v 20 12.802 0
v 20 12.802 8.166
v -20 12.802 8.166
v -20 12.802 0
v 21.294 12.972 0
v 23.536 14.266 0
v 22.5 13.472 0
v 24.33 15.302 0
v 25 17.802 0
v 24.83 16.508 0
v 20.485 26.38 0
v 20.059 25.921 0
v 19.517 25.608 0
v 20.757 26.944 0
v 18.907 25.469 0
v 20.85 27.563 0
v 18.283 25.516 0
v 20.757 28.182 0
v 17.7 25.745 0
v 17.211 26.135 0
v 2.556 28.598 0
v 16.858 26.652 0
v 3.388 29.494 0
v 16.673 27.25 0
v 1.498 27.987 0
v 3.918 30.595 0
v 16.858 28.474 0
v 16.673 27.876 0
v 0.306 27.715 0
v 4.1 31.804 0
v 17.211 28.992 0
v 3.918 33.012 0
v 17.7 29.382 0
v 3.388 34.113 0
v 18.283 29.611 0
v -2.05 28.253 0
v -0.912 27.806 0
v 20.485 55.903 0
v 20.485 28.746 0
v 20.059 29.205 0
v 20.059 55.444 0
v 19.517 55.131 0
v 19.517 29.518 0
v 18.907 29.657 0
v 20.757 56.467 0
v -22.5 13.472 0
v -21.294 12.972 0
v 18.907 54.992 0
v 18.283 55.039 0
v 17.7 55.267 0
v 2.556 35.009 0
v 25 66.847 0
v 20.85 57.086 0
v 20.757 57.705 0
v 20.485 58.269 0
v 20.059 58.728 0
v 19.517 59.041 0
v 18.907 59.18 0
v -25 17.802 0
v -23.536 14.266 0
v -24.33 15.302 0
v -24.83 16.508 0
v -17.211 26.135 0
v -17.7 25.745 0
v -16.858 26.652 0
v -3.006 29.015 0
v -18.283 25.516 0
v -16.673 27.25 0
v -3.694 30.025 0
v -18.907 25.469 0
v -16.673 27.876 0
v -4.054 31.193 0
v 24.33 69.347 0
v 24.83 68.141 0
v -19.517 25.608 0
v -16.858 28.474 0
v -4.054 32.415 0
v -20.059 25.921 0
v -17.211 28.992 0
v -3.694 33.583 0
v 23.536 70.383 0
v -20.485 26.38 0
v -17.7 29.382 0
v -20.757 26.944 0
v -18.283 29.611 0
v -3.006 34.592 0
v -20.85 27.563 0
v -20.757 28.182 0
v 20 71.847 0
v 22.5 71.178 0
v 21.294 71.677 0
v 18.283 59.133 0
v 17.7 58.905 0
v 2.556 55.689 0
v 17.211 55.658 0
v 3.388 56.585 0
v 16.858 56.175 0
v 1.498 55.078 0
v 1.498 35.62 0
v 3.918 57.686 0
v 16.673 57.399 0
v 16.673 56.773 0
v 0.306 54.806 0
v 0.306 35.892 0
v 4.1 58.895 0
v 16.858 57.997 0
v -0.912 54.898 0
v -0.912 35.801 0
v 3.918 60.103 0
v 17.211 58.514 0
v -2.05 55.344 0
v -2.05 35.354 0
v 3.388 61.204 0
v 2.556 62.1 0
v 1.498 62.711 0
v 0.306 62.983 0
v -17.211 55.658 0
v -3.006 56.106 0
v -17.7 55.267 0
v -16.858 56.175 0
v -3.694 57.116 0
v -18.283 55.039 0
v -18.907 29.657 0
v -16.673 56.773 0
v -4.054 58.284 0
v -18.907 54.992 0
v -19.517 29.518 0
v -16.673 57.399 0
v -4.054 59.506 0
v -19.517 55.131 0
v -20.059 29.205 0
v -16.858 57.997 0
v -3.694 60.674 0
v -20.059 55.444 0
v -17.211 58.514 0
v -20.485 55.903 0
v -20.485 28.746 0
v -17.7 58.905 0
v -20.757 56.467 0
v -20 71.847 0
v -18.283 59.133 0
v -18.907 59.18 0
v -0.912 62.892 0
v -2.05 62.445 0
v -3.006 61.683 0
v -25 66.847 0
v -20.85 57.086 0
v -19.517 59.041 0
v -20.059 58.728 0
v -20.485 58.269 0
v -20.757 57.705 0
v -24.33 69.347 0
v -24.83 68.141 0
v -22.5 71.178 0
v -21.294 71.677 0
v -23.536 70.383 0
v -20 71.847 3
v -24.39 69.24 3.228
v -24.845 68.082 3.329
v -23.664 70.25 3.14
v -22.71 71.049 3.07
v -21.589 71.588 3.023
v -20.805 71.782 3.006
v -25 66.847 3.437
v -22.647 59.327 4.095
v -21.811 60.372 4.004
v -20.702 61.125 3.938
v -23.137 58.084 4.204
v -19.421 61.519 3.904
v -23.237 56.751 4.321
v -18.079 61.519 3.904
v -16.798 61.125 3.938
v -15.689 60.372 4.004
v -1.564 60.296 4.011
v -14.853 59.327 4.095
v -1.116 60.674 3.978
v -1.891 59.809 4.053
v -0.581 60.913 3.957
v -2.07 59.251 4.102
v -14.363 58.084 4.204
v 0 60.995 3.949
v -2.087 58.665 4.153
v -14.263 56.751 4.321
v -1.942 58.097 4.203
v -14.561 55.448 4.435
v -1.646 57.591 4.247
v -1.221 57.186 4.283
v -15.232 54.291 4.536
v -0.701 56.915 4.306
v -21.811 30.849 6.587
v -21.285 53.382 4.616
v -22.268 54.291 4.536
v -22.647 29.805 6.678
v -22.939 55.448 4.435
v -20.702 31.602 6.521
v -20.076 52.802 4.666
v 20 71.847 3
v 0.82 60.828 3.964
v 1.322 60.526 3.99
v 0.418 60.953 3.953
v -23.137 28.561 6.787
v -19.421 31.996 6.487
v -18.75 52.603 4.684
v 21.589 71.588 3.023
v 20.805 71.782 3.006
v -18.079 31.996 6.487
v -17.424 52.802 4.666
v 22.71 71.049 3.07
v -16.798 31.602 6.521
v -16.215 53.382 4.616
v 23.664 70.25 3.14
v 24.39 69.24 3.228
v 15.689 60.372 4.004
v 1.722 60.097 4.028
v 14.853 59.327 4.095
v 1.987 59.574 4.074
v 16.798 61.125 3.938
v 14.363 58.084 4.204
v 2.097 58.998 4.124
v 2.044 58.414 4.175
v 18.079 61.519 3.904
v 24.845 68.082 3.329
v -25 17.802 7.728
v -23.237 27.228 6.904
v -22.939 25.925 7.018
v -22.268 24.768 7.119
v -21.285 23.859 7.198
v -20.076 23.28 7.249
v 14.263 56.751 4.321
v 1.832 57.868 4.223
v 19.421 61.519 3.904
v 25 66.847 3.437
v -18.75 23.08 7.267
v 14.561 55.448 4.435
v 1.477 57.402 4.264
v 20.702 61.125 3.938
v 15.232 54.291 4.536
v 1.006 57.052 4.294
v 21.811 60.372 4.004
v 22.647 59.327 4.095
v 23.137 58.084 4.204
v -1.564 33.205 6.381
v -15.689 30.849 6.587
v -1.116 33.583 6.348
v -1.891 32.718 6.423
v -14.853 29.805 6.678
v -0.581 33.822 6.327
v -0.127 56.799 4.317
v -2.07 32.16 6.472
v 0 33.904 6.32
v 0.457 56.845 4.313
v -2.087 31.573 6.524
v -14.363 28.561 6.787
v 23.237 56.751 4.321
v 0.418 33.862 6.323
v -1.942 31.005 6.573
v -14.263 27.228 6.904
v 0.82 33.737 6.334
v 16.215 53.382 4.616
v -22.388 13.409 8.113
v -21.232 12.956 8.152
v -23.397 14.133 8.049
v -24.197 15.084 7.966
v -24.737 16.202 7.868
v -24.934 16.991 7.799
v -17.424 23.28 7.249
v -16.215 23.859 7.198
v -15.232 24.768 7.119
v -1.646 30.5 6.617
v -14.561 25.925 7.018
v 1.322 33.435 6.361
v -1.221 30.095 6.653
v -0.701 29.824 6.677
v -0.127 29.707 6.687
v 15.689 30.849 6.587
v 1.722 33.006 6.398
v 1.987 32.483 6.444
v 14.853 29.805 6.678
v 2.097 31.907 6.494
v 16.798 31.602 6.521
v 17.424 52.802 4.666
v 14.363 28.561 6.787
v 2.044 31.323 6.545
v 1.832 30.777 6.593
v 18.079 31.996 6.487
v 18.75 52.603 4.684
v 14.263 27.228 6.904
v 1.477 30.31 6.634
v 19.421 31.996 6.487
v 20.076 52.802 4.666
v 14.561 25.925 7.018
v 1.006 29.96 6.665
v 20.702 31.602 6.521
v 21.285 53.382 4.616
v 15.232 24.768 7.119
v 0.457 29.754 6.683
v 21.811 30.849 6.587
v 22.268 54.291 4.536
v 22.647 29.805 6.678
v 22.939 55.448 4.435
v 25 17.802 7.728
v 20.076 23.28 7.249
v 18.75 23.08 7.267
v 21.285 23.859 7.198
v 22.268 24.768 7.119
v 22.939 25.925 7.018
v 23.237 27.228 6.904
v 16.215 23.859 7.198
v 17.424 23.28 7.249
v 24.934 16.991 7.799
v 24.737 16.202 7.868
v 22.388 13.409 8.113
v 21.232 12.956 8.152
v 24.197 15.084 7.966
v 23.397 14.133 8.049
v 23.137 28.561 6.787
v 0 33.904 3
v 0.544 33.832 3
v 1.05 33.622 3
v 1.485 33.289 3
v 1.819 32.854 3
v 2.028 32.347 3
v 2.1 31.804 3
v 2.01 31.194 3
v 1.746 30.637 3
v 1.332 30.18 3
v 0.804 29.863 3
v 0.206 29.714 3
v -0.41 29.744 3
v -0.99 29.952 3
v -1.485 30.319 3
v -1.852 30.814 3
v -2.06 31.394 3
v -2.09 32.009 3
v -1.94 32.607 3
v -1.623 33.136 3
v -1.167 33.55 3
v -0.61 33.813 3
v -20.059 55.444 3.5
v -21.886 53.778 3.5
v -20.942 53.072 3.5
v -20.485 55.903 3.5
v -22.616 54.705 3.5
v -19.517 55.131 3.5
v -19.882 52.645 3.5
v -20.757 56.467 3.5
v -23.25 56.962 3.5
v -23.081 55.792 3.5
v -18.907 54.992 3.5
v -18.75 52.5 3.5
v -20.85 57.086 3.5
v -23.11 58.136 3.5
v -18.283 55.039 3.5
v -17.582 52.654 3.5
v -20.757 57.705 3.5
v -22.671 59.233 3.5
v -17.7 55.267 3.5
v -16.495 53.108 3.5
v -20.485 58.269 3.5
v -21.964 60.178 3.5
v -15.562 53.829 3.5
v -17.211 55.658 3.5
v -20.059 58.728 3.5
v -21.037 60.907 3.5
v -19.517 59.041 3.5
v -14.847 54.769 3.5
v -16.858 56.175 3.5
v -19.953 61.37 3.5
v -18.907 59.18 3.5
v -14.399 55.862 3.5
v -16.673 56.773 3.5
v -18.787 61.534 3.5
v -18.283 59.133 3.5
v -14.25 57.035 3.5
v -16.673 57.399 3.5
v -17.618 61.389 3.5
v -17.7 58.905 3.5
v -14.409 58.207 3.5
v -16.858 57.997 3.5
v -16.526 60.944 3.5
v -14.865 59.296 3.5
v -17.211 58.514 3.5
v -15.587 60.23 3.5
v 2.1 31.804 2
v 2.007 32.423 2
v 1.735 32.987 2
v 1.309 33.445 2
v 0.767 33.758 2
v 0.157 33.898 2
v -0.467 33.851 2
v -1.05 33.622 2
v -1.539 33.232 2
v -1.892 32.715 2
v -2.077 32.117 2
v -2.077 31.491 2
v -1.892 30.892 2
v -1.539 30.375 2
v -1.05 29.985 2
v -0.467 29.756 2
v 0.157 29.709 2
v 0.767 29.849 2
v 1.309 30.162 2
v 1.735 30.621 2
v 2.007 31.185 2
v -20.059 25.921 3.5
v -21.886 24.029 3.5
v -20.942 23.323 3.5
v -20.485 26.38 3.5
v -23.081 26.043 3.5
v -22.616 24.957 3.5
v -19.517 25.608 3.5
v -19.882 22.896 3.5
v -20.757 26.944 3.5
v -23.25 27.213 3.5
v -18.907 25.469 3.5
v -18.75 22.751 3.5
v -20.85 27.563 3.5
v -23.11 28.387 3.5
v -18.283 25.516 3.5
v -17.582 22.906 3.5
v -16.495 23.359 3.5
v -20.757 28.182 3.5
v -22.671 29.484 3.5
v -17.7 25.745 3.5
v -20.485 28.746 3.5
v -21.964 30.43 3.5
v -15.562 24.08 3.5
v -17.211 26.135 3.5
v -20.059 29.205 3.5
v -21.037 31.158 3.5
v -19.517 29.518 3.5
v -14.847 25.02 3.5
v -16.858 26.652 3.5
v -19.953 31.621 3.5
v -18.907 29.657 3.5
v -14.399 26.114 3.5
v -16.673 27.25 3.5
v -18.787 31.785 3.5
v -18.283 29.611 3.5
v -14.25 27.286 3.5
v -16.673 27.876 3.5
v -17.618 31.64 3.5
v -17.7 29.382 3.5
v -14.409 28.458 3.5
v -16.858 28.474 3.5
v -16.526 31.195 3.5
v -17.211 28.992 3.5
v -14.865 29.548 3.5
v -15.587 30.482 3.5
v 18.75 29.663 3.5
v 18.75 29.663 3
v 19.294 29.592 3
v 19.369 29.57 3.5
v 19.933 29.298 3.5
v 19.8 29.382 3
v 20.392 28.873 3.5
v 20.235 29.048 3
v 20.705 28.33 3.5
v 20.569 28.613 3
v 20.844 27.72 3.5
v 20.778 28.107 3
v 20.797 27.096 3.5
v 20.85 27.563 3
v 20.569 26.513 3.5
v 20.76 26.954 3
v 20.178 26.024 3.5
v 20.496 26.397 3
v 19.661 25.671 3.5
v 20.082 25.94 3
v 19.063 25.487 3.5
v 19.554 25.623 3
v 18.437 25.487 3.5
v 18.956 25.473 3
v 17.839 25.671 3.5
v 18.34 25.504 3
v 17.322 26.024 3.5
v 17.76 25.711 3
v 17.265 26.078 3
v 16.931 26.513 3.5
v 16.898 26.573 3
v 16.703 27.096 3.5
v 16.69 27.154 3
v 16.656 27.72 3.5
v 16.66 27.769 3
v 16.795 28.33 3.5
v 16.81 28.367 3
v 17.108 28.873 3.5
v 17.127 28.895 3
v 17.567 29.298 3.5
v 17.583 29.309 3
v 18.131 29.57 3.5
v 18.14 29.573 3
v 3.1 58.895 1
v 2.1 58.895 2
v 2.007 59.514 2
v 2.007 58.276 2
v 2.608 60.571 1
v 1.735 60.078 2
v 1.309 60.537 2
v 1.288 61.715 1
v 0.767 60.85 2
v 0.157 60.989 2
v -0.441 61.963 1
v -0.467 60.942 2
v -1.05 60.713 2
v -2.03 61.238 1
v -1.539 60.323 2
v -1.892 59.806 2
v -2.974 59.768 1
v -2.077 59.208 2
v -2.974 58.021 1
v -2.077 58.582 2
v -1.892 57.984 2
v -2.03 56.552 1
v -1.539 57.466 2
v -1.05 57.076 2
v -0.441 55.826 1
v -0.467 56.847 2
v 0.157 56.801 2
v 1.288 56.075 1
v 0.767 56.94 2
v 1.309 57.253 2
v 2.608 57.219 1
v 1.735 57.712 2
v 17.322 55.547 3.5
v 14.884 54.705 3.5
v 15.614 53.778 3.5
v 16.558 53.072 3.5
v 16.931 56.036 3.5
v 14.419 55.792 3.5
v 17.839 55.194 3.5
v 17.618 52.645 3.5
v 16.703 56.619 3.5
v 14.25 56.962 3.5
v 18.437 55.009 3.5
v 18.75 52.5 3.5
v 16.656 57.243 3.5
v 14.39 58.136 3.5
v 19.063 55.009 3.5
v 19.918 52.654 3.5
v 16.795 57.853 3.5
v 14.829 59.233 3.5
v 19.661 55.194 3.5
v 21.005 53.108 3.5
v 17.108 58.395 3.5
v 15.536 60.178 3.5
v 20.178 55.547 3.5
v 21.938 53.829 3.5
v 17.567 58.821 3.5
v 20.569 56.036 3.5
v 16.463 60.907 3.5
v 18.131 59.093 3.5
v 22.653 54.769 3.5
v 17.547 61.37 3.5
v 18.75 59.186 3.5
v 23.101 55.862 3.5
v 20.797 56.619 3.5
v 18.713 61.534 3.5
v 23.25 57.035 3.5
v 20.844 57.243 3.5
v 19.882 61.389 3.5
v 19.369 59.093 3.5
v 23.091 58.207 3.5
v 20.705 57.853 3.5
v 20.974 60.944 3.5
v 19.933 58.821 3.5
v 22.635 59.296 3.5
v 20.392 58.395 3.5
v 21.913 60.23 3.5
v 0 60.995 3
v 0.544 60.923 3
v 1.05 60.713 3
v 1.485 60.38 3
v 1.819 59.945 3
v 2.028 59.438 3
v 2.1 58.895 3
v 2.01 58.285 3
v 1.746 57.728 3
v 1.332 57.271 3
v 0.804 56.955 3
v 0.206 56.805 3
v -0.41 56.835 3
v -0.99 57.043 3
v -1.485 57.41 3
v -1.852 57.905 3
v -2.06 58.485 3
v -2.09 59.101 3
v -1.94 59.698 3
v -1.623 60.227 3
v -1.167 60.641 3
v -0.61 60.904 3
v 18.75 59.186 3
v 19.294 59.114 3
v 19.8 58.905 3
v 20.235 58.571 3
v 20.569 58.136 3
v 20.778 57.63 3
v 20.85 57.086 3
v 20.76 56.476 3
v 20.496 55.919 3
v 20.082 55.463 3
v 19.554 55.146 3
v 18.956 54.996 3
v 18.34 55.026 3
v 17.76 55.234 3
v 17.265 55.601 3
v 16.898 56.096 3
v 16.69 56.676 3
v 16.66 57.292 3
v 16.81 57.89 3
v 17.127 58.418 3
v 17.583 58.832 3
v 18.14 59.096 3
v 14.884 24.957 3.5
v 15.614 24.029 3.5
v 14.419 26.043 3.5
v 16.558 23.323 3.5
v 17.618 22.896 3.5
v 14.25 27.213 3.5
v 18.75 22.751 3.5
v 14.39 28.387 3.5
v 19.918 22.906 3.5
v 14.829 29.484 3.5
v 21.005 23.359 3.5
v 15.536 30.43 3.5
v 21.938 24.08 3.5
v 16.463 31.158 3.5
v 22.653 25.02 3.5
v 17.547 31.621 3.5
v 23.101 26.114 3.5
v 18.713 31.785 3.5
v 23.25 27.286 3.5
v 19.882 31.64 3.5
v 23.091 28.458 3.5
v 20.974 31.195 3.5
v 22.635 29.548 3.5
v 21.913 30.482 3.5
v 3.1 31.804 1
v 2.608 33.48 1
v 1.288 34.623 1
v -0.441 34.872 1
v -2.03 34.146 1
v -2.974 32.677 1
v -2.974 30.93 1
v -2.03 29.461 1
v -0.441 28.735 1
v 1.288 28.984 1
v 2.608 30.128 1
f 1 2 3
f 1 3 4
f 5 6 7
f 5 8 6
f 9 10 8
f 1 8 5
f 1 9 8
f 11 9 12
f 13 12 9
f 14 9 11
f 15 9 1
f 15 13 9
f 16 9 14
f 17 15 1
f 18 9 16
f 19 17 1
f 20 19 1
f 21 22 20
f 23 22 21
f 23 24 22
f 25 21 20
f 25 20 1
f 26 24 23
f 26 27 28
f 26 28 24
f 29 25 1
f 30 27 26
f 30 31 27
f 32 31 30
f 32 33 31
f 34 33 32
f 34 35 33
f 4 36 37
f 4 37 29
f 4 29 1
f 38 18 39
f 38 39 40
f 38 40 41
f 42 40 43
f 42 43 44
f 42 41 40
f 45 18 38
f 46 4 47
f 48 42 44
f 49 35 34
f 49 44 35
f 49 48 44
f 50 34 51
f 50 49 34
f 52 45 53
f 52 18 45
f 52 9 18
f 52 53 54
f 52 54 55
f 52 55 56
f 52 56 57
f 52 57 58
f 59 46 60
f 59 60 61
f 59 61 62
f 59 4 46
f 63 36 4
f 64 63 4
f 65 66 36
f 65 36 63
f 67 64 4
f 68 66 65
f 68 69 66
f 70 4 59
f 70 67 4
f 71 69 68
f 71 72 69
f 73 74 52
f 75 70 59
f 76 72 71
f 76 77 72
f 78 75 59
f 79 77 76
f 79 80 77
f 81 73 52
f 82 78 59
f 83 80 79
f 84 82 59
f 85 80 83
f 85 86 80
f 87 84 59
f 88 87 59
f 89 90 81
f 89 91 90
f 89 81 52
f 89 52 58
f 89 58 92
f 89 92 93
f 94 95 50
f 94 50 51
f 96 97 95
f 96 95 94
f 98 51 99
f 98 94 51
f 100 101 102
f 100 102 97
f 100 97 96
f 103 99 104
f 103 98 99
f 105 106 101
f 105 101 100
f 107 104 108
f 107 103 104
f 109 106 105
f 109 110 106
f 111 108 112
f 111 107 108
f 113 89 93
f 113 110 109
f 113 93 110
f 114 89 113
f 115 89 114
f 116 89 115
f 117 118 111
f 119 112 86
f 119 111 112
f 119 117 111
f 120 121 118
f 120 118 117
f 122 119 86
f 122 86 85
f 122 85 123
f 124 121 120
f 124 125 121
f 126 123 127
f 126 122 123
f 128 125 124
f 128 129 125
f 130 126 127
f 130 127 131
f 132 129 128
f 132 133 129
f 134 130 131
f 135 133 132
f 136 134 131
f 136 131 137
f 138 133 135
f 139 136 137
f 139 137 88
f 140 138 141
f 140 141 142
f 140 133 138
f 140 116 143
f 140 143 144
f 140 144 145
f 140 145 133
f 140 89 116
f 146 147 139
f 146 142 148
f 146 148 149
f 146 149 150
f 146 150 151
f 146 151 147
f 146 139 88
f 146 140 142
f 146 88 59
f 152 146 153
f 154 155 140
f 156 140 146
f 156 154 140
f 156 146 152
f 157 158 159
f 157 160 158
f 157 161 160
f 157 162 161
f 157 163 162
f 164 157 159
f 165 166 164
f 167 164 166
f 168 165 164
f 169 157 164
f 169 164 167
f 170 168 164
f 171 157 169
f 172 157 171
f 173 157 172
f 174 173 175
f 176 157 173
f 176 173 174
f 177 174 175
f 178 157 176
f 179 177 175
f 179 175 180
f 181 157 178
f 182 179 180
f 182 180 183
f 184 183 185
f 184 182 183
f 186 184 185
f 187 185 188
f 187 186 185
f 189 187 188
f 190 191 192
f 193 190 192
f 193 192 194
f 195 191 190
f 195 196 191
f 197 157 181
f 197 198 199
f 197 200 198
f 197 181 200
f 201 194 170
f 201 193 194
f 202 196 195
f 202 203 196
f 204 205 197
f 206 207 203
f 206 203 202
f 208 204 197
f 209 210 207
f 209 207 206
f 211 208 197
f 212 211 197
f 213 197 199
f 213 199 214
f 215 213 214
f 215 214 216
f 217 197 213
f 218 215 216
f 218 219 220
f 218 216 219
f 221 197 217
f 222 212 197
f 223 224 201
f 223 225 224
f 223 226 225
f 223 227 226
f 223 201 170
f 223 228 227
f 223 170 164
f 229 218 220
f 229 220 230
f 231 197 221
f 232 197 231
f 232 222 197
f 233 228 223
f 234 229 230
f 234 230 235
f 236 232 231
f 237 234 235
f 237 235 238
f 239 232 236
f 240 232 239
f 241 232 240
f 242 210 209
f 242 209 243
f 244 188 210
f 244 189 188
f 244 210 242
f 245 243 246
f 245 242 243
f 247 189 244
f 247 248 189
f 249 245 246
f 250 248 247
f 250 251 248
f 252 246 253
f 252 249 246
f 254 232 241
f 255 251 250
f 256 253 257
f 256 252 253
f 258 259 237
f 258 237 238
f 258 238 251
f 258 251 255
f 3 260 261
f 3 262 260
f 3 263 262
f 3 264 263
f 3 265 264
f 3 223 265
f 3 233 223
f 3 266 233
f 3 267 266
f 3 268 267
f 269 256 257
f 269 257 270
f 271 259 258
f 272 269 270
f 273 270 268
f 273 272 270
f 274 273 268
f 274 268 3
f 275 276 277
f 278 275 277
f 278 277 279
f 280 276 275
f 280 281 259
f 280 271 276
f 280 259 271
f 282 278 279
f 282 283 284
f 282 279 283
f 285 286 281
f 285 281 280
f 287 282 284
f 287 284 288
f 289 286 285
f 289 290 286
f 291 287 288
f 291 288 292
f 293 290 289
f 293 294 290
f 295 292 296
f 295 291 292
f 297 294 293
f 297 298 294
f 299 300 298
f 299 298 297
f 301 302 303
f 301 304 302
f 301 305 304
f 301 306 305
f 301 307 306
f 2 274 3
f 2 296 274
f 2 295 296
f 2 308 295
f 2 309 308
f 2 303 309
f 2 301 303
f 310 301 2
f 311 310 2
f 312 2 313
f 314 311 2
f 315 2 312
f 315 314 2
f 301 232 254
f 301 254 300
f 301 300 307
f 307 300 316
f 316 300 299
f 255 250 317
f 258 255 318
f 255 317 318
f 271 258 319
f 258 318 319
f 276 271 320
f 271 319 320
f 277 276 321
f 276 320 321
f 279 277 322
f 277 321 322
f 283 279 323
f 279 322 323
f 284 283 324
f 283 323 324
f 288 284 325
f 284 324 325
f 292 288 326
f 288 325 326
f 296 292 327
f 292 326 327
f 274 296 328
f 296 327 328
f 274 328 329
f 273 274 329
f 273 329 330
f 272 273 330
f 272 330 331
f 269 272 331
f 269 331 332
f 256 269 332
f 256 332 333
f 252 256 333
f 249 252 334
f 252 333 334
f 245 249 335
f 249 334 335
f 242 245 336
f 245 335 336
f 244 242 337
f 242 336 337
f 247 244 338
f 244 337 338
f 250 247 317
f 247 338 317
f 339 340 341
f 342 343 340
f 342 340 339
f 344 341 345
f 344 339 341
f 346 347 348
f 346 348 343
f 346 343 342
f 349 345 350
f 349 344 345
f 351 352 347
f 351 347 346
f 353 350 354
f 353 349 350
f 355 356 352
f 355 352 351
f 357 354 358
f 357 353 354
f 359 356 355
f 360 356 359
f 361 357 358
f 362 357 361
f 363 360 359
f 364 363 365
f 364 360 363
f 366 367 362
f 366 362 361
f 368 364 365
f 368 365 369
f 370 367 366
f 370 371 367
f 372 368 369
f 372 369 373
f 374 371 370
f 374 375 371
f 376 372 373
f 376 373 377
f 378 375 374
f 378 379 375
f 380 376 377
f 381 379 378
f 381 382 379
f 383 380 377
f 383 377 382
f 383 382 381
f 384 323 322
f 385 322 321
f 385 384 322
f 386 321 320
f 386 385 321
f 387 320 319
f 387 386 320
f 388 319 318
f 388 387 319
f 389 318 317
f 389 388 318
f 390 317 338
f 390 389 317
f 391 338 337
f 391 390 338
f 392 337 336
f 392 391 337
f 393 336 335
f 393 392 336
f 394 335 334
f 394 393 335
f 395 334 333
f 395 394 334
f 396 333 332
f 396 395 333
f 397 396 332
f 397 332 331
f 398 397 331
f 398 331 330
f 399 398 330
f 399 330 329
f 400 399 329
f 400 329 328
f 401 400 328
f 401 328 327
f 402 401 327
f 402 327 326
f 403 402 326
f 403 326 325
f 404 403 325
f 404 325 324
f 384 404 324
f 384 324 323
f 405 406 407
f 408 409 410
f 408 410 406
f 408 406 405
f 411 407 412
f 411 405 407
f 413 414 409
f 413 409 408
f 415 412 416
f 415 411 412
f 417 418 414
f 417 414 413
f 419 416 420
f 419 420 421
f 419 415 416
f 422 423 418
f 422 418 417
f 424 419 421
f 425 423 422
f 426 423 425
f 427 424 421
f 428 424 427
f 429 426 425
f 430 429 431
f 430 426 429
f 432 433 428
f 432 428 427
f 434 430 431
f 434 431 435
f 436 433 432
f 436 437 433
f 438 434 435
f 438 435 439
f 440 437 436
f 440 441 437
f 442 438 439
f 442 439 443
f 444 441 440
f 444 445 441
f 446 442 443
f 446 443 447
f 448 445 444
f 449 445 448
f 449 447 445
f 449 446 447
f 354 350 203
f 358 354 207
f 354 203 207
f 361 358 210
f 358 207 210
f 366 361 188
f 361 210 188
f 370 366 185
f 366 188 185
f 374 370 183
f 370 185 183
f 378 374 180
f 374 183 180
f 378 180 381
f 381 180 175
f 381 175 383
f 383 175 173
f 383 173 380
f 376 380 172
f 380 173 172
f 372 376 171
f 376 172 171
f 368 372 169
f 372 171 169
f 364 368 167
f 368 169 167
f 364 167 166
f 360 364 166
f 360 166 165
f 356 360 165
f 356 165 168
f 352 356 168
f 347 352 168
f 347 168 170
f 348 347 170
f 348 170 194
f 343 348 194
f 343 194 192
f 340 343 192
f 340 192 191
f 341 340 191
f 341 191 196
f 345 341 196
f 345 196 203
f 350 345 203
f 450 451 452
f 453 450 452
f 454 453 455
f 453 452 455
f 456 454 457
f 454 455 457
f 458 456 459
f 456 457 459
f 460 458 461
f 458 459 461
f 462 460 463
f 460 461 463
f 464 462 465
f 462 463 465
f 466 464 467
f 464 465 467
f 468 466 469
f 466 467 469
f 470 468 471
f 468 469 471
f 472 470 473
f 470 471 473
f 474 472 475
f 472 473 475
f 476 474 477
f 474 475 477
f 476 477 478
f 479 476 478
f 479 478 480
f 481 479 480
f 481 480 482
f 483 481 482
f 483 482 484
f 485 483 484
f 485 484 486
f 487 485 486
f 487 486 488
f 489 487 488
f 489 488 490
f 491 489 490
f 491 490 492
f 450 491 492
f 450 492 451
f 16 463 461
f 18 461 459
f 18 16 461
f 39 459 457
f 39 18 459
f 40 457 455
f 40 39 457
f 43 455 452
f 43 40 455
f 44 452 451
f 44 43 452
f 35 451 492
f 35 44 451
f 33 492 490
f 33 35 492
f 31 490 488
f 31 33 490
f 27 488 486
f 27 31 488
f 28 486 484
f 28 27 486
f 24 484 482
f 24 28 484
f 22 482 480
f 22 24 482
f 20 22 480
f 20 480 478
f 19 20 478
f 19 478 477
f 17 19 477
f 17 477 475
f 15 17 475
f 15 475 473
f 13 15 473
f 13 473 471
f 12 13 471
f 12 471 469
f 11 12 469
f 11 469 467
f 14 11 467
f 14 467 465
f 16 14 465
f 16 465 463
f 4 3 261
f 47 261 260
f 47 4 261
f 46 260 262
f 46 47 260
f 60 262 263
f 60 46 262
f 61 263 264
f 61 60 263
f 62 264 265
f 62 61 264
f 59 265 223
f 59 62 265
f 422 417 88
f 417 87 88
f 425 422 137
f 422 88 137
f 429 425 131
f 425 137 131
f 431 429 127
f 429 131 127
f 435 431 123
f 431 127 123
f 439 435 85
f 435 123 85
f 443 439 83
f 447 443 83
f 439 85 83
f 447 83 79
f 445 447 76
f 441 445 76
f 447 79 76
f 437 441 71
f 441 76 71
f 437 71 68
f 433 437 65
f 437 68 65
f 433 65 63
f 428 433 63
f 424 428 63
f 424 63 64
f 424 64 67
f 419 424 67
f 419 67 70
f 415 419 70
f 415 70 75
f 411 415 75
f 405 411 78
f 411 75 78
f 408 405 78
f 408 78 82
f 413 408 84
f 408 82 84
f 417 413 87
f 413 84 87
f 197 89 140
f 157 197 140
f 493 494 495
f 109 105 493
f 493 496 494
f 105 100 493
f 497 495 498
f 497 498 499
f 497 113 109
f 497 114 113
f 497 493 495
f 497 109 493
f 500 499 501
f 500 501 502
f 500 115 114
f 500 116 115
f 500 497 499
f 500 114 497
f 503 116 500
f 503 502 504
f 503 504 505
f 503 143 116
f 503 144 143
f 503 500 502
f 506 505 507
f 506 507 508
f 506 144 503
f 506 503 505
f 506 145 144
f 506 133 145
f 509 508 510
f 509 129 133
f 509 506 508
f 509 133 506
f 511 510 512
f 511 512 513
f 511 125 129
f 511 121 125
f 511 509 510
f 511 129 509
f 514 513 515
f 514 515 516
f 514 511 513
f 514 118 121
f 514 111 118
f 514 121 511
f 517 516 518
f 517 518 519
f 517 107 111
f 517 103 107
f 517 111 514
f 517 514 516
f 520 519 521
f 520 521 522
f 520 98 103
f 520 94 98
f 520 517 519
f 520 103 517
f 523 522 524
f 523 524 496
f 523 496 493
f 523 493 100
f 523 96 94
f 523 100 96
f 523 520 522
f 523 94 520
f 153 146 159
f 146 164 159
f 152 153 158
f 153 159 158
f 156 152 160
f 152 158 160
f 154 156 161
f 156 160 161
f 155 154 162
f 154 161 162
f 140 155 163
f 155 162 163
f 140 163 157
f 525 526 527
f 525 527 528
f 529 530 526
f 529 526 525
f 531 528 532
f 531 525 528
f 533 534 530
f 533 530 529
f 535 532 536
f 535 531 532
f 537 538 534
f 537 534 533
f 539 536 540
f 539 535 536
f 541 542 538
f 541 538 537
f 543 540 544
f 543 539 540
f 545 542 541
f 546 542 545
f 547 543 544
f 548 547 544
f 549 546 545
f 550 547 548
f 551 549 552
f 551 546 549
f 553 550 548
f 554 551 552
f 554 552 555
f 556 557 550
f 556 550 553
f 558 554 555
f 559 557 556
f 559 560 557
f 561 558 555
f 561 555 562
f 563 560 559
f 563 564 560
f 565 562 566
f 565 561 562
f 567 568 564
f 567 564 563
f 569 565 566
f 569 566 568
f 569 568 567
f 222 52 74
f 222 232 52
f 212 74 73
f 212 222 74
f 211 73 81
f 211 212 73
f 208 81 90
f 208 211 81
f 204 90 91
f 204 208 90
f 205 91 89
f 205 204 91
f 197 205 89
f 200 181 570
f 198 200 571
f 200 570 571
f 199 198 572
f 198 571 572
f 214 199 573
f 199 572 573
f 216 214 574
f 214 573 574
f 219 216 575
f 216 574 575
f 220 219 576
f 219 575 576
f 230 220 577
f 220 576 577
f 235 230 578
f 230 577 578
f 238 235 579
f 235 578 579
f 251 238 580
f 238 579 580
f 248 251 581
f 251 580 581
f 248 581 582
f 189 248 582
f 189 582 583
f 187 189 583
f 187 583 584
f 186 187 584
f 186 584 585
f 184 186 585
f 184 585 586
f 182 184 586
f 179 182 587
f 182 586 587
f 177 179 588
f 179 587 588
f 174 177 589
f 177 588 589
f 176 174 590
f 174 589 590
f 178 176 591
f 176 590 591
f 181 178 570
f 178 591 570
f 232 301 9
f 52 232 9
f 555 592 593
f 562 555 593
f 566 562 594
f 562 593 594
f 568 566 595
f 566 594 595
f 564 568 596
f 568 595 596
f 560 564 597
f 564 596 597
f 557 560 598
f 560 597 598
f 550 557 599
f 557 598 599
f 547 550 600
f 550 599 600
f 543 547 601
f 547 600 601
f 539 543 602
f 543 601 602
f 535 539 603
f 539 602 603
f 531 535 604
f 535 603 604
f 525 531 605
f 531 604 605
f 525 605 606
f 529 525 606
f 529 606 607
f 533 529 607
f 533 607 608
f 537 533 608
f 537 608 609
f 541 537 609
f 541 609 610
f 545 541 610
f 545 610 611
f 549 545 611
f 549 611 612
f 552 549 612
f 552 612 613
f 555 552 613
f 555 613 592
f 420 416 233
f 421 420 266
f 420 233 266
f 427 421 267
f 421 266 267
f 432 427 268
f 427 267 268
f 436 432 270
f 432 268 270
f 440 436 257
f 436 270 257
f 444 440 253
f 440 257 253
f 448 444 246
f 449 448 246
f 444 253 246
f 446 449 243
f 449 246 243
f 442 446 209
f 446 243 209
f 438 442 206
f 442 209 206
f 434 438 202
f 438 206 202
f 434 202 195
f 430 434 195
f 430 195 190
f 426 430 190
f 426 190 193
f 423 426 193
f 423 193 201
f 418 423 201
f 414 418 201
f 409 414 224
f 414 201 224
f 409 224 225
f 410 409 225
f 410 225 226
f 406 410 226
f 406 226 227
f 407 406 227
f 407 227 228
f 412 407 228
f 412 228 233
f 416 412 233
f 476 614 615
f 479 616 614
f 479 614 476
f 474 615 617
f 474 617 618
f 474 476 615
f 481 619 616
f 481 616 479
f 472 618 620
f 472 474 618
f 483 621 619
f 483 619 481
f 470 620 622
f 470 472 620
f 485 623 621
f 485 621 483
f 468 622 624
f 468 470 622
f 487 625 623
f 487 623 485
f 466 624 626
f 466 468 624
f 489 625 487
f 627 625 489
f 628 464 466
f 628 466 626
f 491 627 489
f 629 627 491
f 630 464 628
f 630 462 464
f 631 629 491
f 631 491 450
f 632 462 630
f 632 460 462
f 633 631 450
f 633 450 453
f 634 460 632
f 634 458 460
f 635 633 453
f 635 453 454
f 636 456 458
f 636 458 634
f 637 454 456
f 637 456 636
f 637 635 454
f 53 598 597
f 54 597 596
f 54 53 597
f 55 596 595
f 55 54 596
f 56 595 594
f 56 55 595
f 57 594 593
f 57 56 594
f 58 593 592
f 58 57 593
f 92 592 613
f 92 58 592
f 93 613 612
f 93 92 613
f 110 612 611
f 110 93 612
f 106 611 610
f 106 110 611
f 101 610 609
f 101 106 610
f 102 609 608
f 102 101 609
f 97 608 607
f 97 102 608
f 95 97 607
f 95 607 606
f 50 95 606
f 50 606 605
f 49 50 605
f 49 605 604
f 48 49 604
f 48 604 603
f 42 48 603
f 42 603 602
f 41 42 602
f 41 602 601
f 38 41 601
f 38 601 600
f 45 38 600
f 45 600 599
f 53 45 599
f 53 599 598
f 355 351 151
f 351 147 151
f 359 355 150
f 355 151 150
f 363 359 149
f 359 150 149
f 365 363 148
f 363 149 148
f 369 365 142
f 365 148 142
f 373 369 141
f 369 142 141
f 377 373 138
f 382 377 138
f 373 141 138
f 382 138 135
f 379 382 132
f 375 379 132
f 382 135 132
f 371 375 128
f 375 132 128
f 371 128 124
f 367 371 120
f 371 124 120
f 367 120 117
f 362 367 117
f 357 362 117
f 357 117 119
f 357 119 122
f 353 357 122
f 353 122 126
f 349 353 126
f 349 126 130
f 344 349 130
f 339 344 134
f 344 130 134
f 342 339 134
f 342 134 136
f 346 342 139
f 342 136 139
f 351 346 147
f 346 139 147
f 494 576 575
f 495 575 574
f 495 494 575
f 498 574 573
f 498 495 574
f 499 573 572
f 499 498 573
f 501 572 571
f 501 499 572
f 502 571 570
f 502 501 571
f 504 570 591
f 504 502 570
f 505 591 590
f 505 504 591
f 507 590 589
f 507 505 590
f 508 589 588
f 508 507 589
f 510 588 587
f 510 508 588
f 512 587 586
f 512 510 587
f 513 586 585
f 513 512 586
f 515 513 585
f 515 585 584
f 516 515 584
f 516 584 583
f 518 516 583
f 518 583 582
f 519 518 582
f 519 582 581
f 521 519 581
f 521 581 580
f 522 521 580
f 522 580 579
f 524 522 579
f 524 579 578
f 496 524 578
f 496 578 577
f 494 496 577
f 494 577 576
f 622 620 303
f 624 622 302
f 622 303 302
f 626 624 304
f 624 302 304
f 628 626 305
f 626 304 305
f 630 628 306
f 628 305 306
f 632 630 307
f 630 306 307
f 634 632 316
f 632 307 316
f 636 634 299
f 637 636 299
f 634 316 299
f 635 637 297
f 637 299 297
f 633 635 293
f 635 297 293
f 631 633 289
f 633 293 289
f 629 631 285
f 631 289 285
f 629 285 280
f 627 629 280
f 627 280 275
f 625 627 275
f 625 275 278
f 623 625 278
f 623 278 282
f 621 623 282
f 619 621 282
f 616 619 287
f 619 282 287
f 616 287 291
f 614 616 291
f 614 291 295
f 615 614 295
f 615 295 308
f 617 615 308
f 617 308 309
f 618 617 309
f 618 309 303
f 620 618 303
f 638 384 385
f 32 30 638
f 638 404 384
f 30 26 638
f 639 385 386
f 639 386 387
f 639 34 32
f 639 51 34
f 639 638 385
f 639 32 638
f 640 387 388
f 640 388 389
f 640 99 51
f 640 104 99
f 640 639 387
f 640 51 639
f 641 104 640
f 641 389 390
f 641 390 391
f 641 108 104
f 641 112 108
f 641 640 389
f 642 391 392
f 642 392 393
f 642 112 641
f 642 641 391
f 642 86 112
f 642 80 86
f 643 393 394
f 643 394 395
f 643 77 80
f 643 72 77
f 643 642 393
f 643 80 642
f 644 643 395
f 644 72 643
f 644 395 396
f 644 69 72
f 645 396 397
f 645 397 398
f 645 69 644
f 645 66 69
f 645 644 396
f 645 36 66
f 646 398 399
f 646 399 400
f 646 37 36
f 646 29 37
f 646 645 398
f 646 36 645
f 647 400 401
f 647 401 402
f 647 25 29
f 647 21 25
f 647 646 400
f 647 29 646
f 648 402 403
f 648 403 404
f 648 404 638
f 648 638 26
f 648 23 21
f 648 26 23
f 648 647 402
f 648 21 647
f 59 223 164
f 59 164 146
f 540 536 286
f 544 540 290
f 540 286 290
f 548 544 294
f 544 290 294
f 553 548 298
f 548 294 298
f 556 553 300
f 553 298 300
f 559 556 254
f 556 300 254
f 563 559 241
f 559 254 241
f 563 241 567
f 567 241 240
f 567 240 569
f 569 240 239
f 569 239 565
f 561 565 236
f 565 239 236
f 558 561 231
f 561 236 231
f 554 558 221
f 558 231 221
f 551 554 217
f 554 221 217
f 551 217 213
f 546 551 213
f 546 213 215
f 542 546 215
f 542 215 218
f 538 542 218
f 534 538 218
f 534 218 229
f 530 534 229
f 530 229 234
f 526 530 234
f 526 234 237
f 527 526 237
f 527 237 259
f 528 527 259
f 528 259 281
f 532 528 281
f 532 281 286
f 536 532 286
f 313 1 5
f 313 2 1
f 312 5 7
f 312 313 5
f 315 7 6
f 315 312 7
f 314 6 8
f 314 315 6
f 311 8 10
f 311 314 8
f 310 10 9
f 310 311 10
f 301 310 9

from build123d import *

# Parameters (mm, degrees)
SCHIZZO1_R                   = 2.1
ESTRUSIONE_ESTRUSIONE1_DEPTH = 3
SMUSSO1_SIZE                 = 2
ESTRUSIONE_ESTRUSIONE2_DEPTH = 50
SCHIZZO3_R                   = 2.1
TAGLIO_ESTRUSIONE1_DEPTH     = 10
RACCORDO1_R                  = 5
TAGLIO_ESTRUSIONE3_REACH     = 77.873
SCHIZZO5_R                   = 4.5


with BuildPart() as part:
    # Schizzo1 → Estrusione-Estrusione1 (new body)
    with BuildSketch(Plane.XY):
        Polygon((0, 71.847389048), (25, 71.847389048), (25, 12.801854913), (0, 12.801854913), (-25, 12.801854913), (-25, 71.847389048), align=None)
        with Locations((18.75, 57.086005514)):
            Circle(SCHIZZO1_R, mode=Mode.SUBTRACT)
        with Locations((18.75, 27.563238447)):
            Circle(SCHIZZO1_R, mode=Mode.SUBTRACT)
        with Locations(Location((-18.75, 27.563238447, 0), (0, 0, 180))):
            Circle(SCHIZZO1_R, mode=Mode.SUBTRACT)
        with Locations(Location((-18.75, 57.086005514, 0), (0, 0, 180))):
            Circle(SCHIZZO1_R, mode=Mode.SUBTRACT)
        with Locations((0, 58.89473309)):
            Circle(SCHIZZO1_R, mode=Mode.SUBTRACT)
        with Locations((0, 31.80362551)):
            Circle(SCHIZZO1_R, mode=Mode.SUBTRACT)
    extrude(amount=ESTRUSIONE_ESTRUSIONE1_DEPTH)

    # Smusso1
    smusso1_edges = [part.edges().sort_by_distance(p)[0] for p in [
        (-2.1, 58.89473309, 0),
        (-2.1, 31.80362551, 0),
    ]]
    chamfer(smusso1_edges, length=SMUSSO1_SIZE)

    # Schizzo2 → Estrusione-Estrusione2 (add)
    with BuildSketch(Plane(origin=(25, 0, 0), x_dir=(0, 0, -1), z_dir=(1, 0, 0))):
        Polygon((-3, 71.847389048), (-8.165814869, 12.801854913), (-3, 12.801854913), align=None)
    extrude(amount=-ESTRUSIONE_ESTRUSIONE2_DEPTH)

    # Schizzo3 → Taglio-Estrusione1 (cut)
    with BuildSketch(Plane(origin=(0, 0, 3), x_dir=(-1, 0, 0), z_dir=(0, 0, -1))):
        with Locations((18.75, 27.563238447)):
            Circle(SCHIZZO3_R)
        with Locations((18.75, 57.086005514)):
            Circle(SCHIZZO3_R)
        with Locations(Location((-18.75, 57.086005514, 0), (0, 0, 90))):
            Circle(SCHIZZO3_R)
        with Locations(Location((-18.75, 27.563238447, 0), (0, 0, 90))):
            Circle(SCHIZZO3_R)
        with Locations(Location((0, 31.80362551, 0), (0, 0, 90))):
            Circle(SCHIZZO3_R)
        with Locations(Location((0, 58.89473309, 0), (0, 0, 90))):
            Circle(SCHIZZO3_R)
    extrude(amount=-TAGLIO_ESTRUSIONE1_DEPTH, mode=Mode.SUBTRACT)

    # Raccordo1
    raccordo1_edges = [part.edges().sort_by_distance(p)[0] for p in [
        (25, 71.847389048, 1.5),
        (25, 12.801854913, 4.082907434),
        (-25, 12.801854913, 4.082907434),
        (-25, 71.847389048, 1.5),
    ]]
    fillet(raccordo1_edges, radius=RACCORDO1_R)

    # Taglio-Estrusione3: up to this plane
    taglio_estrusione3_end = Plane(origin=(0, 0, 3.5), z_dir=(0, 0, 1))
    # Schizzo5 → Taglio-Estrusione3 (cut, up to the surface)
    with BuildSketch(Plane(origin=(0, 0.806233906, 9.215295719), x_dir=(1, 0, 0), z_dir=(0, 0.08715574274765137, 0.9961946980917462)), mode=Mode.PRIVATE) as taglio_estrusione3_sk1:
        with Locations(Location((-18.75, 56.494751192, 0), (0, 0, 270))):
            Circle(SCHIZZO5_R)
    taglio_estrusione3_tool1 = split(extrude(taglio_estrusione3_sk1.sketch, amount=-TAGLIO_ESTRUSIONE3_REACH, mode=Mode.PRIVATE), bisect_by=taglio_estrusione3_end, keep=Keep.BOTH, mode=Mode.PRIVATE)
    add(taglio_estrusione3_tool1.solids().sort_by_distance((-18.75, 57.086006, 4.291454))[0], mode=Mode.SUBTRACT)
    # Schizzo5 → Taglio-Estrusione3 (cut, up to the surface)
    with BuildSketch(Plane(origin=(0, 0.806233906, 9.215295719), x_dir=(1, 0, 0), z_dir=(0, 0.08715574274765137, 0.9961946980917462)), mode=Mode.PRIVATE) as taglio_estrusione3_sk2:
        with Locations(Location((18.75, 56.494751192, 0), (0, 0, 270))):
            Circle(SCHIZZO5_R)
    taglio_estrusione3_tool2 = split(extrude(taglio_estrusione3_sk2.sketch, amount=-TAGLIO_ESTRUSIONE3_REACH, mode=Mode.PRIVATE), bisect_by=taglio_estrusione3_end, keep=Keep.BOTH, mode=Mode.PRIVATE)
    add(taglio_estrusione3_tool2.solids().sort_by_distance((18.75, 57.086006, 4.291454))[0], mode=Mode.SUBTRACT)
    # Schizzo5 → Taglio-Estrusione3 (cut, up to the surface)
    with BuildSketch(Plane(origin=(0, 0.806233906, 9.215295719), x_dir=(1, 0, 0), z_dir=(0, 0.08715574274765137, 0.9961946980917462)), mode=Mode.PRIVATE) as taglio_estrusione3_sk3:
        with Locations(Location((18.75, 26.859211951, 0), (0, 0, 270))):
            Circle(SCHIZZO5_R)
    taglio_estrusione3_tool3 = split(extrude(taglio_estrusione3_sk3.sketch, amount=-TAGLIO_ESTRUSIONE3_REACH, mode=Mode.PRIVATE), bisect_by=taglio_estrusione3_end, keep=Keep.BOTH, mode=Mode.PRIVATE)
    add(taglio_estrusione3_tool3.solids().sort_by_distance((18.75, 27.563238, 6.874361))[0], mode=Mode.SUBTRACT)
    # Schizzo5 → Taglio-Estrusione3 (cut, up to the surface)
    with BuildSketch(Plane(origin=(0, 0.806233906, 9.215295719), x_dir=(1, 0, 0), z_dir=(0, 0.08715574274765137, 0.9961946980917462)), mode=Mode.PRIVATE) as taglio_estrusione3_sk4:
        with Locations(Location((-18.75, 26.859211951, 0), (0, 0, 270))):
            Circle(SCHIZZO5_R)
    taglio_estrusione3_tool4 = split(extrude(taglio_estrusione3_sk4.sketch, amount=-TAGLIO_ESTRUSIONE3_REACH, mode=Mode.PRIVATE), bisect_by=taglio_estrusione3_end, keep=Keep.BOTH, mode=Mode.PRIVATE)
    add(taglio_estrusione3_tool4.solids().sort_by_distance((-18.75, 27.563238, 6.874361))[0], mode=Mode.SUBTRACT)


solid = part.part
